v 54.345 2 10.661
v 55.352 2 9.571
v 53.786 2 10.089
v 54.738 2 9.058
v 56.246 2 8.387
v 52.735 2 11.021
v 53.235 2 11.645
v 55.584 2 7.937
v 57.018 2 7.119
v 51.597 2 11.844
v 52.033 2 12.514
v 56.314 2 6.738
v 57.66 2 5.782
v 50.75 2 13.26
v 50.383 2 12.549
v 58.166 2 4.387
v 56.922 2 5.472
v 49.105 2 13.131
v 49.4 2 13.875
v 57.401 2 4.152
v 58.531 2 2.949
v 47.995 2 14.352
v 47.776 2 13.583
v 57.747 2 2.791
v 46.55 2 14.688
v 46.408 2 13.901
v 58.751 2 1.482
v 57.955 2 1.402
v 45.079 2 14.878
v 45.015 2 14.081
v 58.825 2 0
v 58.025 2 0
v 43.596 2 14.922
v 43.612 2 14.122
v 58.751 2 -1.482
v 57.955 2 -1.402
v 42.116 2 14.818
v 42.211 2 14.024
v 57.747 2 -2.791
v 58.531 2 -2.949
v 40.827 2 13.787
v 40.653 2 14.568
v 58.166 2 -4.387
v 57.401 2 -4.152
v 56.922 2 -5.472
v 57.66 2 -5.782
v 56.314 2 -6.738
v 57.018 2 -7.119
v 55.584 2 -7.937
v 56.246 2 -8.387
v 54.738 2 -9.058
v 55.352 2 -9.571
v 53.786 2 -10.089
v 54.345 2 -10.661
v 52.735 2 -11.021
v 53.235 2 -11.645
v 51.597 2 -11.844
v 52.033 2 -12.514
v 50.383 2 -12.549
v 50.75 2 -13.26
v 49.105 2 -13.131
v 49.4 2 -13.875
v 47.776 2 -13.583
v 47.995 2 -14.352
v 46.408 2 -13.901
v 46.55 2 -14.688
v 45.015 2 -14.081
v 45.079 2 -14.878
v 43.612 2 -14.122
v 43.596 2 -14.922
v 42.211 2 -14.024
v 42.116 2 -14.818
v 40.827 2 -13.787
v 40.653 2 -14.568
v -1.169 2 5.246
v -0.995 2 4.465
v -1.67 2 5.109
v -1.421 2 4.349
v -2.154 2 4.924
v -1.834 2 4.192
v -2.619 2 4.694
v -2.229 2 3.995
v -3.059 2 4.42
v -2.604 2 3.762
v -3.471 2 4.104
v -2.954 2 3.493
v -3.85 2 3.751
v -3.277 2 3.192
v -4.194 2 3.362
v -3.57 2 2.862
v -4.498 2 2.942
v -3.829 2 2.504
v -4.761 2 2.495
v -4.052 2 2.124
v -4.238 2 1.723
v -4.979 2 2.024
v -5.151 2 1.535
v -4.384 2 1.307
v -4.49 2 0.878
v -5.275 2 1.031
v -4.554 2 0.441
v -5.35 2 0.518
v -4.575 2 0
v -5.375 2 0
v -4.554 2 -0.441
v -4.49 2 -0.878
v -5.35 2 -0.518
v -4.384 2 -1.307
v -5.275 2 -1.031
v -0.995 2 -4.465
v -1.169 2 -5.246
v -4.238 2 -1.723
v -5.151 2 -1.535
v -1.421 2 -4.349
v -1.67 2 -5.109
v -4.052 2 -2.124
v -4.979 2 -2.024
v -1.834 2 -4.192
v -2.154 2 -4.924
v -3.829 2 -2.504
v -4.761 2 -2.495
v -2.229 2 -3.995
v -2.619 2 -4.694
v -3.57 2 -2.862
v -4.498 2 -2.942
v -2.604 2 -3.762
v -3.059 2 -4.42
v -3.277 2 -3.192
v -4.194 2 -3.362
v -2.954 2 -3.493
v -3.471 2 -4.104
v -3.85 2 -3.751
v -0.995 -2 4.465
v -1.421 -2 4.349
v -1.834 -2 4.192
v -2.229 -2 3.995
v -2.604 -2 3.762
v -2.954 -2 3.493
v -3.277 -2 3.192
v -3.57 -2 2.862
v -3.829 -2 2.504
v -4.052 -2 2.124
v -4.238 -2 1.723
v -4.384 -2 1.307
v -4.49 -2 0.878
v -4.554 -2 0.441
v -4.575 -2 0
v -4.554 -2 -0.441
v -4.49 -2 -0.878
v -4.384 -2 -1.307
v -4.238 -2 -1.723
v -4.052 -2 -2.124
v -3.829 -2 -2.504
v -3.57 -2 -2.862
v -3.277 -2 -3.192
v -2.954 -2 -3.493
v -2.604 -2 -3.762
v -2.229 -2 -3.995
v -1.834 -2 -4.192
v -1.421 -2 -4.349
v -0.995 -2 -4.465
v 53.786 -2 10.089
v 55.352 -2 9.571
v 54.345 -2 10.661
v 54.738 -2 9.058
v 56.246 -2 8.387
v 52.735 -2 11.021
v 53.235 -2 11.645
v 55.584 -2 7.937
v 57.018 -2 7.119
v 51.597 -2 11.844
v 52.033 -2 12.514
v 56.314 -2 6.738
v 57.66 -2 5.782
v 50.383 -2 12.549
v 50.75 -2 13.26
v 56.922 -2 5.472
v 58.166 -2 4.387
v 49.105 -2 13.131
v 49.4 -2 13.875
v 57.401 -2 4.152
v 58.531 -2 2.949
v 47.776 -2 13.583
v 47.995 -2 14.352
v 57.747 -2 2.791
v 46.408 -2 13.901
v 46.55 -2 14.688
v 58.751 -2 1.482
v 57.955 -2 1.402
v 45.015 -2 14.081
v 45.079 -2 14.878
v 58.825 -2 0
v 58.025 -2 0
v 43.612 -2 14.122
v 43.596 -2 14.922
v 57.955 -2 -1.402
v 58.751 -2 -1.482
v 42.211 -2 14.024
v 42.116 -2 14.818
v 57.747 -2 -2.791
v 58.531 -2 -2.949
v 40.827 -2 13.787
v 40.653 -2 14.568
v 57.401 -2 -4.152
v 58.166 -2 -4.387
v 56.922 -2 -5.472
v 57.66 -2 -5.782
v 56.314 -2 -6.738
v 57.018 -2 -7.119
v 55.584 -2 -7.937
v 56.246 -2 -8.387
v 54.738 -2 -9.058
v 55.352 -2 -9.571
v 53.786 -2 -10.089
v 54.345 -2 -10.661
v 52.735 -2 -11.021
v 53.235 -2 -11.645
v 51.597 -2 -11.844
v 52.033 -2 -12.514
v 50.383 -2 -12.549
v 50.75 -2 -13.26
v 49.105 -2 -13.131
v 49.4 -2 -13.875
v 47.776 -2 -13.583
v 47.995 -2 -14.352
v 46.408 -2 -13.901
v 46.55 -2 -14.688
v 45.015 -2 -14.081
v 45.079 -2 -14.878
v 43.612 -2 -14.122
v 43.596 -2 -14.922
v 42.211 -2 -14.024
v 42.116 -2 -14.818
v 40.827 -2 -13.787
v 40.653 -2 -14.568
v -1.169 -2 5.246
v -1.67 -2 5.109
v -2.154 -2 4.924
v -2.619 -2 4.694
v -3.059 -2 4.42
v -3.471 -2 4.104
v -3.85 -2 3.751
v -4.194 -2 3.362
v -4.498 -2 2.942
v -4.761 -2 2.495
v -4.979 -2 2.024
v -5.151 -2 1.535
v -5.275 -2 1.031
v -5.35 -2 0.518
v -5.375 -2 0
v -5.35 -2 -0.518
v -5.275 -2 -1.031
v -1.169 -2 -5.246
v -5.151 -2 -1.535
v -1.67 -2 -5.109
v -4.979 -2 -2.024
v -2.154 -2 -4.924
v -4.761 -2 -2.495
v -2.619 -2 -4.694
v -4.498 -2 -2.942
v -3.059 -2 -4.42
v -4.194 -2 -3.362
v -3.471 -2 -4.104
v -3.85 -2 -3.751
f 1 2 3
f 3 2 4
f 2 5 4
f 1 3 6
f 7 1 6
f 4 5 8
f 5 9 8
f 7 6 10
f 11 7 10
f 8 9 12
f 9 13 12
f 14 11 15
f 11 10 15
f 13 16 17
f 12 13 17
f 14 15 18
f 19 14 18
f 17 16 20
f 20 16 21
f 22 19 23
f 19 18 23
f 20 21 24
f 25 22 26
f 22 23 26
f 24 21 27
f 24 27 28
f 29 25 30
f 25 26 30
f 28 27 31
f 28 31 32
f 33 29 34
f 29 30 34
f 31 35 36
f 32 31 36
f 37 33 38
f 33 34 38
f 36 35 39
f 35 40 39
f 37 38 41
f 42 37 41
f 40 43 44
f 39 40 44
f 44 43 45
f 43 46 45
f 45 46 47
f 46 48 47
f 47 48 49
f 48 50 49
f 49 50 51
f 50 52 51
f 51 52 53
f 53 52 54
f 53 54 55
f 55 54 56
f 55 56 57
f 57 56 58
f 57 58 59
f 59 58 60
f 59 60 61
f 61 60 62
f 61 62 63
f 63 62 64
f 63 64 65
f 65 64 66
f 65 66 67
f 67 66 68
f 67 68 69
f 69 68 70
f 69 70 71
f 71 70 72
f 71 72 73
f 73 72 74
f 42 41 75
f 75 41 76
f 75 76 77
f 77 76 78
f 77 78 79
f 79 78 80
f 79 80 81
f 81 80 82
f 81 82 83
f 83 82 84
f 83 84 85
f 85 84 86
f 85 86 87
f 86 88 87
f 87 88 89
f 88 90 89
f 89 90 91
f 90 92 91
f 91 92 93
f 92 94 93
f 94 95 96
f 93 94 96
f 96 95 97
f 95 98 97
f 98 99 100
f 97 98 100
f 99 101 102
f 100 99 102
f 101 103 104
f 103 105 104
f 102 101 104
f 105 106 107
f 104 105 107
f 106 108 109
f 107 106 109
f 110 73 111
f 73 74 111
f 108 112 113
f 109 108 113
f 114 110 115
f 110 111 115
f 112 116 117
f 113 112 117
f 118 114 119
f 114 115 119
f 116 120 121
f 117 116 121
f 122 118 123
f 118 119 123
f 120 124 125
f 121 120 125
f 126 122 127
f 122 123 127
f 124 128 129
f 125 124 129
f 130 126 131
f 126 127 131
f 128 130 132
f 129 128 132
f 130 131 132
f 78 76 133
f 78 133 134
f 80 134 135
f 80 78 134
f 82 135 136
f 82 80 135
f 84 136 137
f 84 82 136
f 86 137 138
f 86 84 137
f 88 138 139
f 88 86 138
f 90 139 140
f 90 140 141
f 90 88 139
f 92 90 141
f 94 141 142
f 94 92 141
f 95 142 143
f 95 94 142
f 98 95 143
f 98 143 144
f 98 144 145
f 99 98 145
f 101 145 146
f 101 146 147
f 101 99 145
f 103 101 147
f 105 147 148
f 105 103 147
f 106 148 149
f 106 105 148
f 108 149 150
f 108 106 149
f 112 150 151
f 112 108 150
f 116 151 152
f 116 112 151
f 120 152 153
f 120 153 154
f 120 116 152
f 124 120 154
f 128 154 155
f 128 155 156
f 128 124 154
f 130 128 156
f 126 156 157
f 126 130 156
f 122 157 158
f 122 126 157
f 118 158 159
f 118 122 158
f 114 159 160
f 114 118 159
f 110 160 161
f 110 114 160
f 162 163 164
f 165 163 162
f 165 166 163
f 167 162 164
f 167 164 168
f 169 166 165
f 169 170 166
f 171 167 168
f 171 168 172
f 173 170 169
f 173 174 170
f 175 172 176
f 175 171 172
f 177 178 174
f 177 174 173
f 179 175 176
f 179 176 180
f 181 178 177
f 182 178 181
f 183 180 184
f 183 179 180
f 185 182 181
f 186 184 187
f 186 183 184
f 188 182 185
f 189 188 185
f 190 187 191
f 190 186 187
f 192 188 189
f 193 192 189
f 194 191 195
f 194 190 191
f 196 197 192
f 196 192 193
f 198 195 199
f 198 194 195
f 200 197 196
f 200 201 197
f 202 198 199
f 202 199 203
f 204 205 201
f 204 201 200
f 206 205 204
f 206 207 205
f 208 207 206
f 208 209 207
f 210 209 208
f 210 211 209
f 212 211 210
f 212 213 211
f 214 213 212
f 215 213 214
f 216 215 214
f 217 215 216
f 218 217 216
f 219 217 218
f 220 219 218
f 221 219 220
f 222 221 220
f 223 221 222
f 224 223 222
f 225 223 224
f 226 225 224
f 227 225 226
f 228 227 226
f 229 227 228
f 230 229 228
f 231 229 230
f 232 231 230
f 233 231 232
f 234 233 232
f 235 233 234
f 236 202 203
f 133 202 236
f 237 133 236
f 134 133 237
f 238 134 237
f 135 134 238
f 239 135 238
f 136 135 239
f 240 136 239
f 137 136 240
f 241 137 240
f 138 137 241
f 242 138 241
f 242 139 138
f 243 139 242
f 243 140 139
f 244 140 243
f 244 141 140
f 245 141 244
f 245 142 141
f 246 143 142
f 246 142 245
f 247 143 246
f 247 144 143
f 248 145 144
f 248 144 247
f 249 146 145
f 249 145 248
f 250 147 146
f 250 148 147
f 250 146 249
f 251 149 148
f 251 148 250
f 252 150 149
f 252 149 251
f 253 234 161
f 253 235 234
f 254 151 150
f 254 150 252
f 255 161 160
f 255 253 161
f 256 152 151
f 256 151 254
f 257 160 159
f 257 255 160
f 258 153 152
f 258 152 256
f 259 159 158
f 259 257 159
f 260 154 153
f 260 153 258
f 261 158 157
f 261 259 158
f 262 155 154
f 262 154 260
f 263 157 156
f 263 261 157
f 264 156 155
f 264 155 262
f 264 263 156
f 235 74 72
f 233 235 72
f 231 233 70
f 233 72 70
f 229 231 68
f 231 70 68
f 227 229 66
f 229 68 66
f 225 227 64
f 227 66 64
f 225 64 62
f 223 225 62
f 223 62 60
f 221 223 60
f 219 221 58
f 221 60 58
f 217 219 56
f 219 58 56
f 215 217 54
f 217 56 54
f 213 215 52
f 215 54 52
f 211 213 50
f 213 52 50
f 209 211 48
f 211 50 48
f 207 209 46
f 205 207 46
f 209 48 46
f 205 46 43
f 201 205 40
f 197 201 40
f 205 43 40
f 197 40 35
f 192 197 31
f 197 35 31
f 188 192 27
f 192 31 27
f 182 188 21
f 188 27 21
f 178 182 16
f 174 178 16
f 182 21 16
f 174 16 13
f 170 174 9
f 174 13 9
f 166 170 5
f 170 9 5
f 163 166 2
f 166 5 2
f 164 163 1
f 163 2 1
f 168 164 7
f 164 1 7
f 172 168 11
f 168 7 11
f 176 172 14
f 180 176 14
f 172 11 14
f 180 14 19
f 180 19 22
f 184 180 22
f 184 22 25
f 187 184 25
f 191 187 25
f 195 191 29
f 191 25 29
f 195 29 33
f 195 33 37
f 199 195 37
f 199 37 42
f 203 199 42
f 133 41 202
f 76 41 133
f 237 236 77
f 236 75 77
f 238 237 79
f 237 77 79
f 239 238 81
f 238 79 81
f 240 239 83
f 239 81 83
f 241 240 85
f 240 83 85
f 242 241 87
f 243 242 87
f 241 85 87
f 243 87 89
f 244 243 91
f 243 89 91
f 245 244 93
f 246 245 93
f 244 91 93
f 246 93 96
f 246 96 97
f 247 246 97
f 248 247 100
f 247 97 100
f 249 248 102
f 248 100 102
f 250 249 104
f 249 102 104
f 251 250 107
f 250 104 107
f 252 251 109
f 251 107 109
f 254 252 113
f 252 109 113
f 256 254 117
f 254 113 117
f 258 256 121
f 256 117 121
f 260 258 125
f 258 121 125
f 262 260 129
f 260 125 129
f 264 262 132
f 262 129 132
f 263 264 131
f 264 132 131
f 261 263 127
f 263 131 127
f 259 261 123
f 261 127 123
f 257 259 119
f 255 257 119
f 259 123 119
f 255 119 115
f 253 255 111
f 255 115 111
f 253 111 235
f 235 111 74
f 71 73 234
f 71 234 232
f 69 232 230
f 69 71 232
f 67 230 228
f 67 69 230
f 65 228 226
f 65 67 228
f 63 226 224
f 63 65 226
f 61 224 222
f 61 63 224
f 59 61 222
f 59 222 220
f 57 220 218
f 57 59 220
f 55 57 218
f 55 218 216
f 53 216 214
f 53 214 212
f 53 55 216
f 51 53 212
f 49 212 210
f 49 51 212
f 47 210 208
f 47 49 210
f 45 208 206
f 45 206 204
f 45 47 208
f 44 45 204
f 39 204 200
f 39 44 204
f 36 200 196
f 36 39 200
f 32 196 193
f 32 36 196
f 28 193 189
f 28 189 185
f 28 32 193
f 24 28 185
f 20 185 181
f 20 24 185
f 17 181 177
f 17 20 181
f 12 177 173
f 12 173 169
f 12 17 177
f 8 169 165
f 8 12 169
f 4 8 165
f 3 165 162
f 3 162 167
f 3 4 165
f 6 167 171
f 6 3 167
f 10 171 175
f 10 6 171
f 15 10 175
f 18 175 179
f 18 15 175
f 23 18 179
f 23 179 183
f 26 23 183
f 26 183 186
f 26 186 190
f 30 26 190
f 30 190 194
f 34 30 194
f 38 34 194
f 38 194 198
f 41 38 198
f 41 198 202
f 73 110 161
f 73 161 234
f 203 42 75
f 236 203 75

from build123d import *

# Parameters (mm, degrees)
LINEAR_AUSTRAGEN_D_NN1_DEPTH      = 2
LINEAR_AUSTRAGEN_D_NN1_DEPTH_BACK = 2


with BuildPart() as part:
    # Skizze1 → Linear-Austragen-D_nn1 (new body, two sides)
    with BuildSketch(Plane(origin=(0, 0, 0), x_dir=(1, 0, 0), z_dir=(0, 1, 0))) as linear_austragen_d_nn1_sk:
        with BuildLine():
            Line((40.65321754, -14.567567699), (-1.169276765, -5.246276474))
            ThreePointArc((-1.169276765, -5.246276474), (-5.375, 0), (-1.169276765, 5.246276474))
            Line((-1.169276765, 5.246276474), (40.65321754, 14.567567699))
            ThreePointArc((40.65321754, 14.567567699), (58.825, 0), (40.65321754, -14.567567699))
        make_face()
        with BuildLine():
            Line((40.827249431, -13.786726549), (-0.995244875, -4.465435325))
            ThreePointArc((-0.995244875, -4.465435325), (-4.575, 0), (-0.995244875, 4.465435325))
            Line((-0.995244875, 4.465435325), (40.827249431, 13.786726549))
            ThreePointArc((40.827249431, 13.786726549), (58.025, 0), (40.827249431, -13.786726549))
        make_face(mode=Mode.SUBTRACT)
    extrude(amount=LINEAR_AUSTRAGEN_D_NN1_DEPTH)
    extrude(linear_austragen_d_nn1_sk.sketch, amount=-LINEAR_AUSTRAGEN_D_NN1_DEPTH_BACK)


solid = part.part
